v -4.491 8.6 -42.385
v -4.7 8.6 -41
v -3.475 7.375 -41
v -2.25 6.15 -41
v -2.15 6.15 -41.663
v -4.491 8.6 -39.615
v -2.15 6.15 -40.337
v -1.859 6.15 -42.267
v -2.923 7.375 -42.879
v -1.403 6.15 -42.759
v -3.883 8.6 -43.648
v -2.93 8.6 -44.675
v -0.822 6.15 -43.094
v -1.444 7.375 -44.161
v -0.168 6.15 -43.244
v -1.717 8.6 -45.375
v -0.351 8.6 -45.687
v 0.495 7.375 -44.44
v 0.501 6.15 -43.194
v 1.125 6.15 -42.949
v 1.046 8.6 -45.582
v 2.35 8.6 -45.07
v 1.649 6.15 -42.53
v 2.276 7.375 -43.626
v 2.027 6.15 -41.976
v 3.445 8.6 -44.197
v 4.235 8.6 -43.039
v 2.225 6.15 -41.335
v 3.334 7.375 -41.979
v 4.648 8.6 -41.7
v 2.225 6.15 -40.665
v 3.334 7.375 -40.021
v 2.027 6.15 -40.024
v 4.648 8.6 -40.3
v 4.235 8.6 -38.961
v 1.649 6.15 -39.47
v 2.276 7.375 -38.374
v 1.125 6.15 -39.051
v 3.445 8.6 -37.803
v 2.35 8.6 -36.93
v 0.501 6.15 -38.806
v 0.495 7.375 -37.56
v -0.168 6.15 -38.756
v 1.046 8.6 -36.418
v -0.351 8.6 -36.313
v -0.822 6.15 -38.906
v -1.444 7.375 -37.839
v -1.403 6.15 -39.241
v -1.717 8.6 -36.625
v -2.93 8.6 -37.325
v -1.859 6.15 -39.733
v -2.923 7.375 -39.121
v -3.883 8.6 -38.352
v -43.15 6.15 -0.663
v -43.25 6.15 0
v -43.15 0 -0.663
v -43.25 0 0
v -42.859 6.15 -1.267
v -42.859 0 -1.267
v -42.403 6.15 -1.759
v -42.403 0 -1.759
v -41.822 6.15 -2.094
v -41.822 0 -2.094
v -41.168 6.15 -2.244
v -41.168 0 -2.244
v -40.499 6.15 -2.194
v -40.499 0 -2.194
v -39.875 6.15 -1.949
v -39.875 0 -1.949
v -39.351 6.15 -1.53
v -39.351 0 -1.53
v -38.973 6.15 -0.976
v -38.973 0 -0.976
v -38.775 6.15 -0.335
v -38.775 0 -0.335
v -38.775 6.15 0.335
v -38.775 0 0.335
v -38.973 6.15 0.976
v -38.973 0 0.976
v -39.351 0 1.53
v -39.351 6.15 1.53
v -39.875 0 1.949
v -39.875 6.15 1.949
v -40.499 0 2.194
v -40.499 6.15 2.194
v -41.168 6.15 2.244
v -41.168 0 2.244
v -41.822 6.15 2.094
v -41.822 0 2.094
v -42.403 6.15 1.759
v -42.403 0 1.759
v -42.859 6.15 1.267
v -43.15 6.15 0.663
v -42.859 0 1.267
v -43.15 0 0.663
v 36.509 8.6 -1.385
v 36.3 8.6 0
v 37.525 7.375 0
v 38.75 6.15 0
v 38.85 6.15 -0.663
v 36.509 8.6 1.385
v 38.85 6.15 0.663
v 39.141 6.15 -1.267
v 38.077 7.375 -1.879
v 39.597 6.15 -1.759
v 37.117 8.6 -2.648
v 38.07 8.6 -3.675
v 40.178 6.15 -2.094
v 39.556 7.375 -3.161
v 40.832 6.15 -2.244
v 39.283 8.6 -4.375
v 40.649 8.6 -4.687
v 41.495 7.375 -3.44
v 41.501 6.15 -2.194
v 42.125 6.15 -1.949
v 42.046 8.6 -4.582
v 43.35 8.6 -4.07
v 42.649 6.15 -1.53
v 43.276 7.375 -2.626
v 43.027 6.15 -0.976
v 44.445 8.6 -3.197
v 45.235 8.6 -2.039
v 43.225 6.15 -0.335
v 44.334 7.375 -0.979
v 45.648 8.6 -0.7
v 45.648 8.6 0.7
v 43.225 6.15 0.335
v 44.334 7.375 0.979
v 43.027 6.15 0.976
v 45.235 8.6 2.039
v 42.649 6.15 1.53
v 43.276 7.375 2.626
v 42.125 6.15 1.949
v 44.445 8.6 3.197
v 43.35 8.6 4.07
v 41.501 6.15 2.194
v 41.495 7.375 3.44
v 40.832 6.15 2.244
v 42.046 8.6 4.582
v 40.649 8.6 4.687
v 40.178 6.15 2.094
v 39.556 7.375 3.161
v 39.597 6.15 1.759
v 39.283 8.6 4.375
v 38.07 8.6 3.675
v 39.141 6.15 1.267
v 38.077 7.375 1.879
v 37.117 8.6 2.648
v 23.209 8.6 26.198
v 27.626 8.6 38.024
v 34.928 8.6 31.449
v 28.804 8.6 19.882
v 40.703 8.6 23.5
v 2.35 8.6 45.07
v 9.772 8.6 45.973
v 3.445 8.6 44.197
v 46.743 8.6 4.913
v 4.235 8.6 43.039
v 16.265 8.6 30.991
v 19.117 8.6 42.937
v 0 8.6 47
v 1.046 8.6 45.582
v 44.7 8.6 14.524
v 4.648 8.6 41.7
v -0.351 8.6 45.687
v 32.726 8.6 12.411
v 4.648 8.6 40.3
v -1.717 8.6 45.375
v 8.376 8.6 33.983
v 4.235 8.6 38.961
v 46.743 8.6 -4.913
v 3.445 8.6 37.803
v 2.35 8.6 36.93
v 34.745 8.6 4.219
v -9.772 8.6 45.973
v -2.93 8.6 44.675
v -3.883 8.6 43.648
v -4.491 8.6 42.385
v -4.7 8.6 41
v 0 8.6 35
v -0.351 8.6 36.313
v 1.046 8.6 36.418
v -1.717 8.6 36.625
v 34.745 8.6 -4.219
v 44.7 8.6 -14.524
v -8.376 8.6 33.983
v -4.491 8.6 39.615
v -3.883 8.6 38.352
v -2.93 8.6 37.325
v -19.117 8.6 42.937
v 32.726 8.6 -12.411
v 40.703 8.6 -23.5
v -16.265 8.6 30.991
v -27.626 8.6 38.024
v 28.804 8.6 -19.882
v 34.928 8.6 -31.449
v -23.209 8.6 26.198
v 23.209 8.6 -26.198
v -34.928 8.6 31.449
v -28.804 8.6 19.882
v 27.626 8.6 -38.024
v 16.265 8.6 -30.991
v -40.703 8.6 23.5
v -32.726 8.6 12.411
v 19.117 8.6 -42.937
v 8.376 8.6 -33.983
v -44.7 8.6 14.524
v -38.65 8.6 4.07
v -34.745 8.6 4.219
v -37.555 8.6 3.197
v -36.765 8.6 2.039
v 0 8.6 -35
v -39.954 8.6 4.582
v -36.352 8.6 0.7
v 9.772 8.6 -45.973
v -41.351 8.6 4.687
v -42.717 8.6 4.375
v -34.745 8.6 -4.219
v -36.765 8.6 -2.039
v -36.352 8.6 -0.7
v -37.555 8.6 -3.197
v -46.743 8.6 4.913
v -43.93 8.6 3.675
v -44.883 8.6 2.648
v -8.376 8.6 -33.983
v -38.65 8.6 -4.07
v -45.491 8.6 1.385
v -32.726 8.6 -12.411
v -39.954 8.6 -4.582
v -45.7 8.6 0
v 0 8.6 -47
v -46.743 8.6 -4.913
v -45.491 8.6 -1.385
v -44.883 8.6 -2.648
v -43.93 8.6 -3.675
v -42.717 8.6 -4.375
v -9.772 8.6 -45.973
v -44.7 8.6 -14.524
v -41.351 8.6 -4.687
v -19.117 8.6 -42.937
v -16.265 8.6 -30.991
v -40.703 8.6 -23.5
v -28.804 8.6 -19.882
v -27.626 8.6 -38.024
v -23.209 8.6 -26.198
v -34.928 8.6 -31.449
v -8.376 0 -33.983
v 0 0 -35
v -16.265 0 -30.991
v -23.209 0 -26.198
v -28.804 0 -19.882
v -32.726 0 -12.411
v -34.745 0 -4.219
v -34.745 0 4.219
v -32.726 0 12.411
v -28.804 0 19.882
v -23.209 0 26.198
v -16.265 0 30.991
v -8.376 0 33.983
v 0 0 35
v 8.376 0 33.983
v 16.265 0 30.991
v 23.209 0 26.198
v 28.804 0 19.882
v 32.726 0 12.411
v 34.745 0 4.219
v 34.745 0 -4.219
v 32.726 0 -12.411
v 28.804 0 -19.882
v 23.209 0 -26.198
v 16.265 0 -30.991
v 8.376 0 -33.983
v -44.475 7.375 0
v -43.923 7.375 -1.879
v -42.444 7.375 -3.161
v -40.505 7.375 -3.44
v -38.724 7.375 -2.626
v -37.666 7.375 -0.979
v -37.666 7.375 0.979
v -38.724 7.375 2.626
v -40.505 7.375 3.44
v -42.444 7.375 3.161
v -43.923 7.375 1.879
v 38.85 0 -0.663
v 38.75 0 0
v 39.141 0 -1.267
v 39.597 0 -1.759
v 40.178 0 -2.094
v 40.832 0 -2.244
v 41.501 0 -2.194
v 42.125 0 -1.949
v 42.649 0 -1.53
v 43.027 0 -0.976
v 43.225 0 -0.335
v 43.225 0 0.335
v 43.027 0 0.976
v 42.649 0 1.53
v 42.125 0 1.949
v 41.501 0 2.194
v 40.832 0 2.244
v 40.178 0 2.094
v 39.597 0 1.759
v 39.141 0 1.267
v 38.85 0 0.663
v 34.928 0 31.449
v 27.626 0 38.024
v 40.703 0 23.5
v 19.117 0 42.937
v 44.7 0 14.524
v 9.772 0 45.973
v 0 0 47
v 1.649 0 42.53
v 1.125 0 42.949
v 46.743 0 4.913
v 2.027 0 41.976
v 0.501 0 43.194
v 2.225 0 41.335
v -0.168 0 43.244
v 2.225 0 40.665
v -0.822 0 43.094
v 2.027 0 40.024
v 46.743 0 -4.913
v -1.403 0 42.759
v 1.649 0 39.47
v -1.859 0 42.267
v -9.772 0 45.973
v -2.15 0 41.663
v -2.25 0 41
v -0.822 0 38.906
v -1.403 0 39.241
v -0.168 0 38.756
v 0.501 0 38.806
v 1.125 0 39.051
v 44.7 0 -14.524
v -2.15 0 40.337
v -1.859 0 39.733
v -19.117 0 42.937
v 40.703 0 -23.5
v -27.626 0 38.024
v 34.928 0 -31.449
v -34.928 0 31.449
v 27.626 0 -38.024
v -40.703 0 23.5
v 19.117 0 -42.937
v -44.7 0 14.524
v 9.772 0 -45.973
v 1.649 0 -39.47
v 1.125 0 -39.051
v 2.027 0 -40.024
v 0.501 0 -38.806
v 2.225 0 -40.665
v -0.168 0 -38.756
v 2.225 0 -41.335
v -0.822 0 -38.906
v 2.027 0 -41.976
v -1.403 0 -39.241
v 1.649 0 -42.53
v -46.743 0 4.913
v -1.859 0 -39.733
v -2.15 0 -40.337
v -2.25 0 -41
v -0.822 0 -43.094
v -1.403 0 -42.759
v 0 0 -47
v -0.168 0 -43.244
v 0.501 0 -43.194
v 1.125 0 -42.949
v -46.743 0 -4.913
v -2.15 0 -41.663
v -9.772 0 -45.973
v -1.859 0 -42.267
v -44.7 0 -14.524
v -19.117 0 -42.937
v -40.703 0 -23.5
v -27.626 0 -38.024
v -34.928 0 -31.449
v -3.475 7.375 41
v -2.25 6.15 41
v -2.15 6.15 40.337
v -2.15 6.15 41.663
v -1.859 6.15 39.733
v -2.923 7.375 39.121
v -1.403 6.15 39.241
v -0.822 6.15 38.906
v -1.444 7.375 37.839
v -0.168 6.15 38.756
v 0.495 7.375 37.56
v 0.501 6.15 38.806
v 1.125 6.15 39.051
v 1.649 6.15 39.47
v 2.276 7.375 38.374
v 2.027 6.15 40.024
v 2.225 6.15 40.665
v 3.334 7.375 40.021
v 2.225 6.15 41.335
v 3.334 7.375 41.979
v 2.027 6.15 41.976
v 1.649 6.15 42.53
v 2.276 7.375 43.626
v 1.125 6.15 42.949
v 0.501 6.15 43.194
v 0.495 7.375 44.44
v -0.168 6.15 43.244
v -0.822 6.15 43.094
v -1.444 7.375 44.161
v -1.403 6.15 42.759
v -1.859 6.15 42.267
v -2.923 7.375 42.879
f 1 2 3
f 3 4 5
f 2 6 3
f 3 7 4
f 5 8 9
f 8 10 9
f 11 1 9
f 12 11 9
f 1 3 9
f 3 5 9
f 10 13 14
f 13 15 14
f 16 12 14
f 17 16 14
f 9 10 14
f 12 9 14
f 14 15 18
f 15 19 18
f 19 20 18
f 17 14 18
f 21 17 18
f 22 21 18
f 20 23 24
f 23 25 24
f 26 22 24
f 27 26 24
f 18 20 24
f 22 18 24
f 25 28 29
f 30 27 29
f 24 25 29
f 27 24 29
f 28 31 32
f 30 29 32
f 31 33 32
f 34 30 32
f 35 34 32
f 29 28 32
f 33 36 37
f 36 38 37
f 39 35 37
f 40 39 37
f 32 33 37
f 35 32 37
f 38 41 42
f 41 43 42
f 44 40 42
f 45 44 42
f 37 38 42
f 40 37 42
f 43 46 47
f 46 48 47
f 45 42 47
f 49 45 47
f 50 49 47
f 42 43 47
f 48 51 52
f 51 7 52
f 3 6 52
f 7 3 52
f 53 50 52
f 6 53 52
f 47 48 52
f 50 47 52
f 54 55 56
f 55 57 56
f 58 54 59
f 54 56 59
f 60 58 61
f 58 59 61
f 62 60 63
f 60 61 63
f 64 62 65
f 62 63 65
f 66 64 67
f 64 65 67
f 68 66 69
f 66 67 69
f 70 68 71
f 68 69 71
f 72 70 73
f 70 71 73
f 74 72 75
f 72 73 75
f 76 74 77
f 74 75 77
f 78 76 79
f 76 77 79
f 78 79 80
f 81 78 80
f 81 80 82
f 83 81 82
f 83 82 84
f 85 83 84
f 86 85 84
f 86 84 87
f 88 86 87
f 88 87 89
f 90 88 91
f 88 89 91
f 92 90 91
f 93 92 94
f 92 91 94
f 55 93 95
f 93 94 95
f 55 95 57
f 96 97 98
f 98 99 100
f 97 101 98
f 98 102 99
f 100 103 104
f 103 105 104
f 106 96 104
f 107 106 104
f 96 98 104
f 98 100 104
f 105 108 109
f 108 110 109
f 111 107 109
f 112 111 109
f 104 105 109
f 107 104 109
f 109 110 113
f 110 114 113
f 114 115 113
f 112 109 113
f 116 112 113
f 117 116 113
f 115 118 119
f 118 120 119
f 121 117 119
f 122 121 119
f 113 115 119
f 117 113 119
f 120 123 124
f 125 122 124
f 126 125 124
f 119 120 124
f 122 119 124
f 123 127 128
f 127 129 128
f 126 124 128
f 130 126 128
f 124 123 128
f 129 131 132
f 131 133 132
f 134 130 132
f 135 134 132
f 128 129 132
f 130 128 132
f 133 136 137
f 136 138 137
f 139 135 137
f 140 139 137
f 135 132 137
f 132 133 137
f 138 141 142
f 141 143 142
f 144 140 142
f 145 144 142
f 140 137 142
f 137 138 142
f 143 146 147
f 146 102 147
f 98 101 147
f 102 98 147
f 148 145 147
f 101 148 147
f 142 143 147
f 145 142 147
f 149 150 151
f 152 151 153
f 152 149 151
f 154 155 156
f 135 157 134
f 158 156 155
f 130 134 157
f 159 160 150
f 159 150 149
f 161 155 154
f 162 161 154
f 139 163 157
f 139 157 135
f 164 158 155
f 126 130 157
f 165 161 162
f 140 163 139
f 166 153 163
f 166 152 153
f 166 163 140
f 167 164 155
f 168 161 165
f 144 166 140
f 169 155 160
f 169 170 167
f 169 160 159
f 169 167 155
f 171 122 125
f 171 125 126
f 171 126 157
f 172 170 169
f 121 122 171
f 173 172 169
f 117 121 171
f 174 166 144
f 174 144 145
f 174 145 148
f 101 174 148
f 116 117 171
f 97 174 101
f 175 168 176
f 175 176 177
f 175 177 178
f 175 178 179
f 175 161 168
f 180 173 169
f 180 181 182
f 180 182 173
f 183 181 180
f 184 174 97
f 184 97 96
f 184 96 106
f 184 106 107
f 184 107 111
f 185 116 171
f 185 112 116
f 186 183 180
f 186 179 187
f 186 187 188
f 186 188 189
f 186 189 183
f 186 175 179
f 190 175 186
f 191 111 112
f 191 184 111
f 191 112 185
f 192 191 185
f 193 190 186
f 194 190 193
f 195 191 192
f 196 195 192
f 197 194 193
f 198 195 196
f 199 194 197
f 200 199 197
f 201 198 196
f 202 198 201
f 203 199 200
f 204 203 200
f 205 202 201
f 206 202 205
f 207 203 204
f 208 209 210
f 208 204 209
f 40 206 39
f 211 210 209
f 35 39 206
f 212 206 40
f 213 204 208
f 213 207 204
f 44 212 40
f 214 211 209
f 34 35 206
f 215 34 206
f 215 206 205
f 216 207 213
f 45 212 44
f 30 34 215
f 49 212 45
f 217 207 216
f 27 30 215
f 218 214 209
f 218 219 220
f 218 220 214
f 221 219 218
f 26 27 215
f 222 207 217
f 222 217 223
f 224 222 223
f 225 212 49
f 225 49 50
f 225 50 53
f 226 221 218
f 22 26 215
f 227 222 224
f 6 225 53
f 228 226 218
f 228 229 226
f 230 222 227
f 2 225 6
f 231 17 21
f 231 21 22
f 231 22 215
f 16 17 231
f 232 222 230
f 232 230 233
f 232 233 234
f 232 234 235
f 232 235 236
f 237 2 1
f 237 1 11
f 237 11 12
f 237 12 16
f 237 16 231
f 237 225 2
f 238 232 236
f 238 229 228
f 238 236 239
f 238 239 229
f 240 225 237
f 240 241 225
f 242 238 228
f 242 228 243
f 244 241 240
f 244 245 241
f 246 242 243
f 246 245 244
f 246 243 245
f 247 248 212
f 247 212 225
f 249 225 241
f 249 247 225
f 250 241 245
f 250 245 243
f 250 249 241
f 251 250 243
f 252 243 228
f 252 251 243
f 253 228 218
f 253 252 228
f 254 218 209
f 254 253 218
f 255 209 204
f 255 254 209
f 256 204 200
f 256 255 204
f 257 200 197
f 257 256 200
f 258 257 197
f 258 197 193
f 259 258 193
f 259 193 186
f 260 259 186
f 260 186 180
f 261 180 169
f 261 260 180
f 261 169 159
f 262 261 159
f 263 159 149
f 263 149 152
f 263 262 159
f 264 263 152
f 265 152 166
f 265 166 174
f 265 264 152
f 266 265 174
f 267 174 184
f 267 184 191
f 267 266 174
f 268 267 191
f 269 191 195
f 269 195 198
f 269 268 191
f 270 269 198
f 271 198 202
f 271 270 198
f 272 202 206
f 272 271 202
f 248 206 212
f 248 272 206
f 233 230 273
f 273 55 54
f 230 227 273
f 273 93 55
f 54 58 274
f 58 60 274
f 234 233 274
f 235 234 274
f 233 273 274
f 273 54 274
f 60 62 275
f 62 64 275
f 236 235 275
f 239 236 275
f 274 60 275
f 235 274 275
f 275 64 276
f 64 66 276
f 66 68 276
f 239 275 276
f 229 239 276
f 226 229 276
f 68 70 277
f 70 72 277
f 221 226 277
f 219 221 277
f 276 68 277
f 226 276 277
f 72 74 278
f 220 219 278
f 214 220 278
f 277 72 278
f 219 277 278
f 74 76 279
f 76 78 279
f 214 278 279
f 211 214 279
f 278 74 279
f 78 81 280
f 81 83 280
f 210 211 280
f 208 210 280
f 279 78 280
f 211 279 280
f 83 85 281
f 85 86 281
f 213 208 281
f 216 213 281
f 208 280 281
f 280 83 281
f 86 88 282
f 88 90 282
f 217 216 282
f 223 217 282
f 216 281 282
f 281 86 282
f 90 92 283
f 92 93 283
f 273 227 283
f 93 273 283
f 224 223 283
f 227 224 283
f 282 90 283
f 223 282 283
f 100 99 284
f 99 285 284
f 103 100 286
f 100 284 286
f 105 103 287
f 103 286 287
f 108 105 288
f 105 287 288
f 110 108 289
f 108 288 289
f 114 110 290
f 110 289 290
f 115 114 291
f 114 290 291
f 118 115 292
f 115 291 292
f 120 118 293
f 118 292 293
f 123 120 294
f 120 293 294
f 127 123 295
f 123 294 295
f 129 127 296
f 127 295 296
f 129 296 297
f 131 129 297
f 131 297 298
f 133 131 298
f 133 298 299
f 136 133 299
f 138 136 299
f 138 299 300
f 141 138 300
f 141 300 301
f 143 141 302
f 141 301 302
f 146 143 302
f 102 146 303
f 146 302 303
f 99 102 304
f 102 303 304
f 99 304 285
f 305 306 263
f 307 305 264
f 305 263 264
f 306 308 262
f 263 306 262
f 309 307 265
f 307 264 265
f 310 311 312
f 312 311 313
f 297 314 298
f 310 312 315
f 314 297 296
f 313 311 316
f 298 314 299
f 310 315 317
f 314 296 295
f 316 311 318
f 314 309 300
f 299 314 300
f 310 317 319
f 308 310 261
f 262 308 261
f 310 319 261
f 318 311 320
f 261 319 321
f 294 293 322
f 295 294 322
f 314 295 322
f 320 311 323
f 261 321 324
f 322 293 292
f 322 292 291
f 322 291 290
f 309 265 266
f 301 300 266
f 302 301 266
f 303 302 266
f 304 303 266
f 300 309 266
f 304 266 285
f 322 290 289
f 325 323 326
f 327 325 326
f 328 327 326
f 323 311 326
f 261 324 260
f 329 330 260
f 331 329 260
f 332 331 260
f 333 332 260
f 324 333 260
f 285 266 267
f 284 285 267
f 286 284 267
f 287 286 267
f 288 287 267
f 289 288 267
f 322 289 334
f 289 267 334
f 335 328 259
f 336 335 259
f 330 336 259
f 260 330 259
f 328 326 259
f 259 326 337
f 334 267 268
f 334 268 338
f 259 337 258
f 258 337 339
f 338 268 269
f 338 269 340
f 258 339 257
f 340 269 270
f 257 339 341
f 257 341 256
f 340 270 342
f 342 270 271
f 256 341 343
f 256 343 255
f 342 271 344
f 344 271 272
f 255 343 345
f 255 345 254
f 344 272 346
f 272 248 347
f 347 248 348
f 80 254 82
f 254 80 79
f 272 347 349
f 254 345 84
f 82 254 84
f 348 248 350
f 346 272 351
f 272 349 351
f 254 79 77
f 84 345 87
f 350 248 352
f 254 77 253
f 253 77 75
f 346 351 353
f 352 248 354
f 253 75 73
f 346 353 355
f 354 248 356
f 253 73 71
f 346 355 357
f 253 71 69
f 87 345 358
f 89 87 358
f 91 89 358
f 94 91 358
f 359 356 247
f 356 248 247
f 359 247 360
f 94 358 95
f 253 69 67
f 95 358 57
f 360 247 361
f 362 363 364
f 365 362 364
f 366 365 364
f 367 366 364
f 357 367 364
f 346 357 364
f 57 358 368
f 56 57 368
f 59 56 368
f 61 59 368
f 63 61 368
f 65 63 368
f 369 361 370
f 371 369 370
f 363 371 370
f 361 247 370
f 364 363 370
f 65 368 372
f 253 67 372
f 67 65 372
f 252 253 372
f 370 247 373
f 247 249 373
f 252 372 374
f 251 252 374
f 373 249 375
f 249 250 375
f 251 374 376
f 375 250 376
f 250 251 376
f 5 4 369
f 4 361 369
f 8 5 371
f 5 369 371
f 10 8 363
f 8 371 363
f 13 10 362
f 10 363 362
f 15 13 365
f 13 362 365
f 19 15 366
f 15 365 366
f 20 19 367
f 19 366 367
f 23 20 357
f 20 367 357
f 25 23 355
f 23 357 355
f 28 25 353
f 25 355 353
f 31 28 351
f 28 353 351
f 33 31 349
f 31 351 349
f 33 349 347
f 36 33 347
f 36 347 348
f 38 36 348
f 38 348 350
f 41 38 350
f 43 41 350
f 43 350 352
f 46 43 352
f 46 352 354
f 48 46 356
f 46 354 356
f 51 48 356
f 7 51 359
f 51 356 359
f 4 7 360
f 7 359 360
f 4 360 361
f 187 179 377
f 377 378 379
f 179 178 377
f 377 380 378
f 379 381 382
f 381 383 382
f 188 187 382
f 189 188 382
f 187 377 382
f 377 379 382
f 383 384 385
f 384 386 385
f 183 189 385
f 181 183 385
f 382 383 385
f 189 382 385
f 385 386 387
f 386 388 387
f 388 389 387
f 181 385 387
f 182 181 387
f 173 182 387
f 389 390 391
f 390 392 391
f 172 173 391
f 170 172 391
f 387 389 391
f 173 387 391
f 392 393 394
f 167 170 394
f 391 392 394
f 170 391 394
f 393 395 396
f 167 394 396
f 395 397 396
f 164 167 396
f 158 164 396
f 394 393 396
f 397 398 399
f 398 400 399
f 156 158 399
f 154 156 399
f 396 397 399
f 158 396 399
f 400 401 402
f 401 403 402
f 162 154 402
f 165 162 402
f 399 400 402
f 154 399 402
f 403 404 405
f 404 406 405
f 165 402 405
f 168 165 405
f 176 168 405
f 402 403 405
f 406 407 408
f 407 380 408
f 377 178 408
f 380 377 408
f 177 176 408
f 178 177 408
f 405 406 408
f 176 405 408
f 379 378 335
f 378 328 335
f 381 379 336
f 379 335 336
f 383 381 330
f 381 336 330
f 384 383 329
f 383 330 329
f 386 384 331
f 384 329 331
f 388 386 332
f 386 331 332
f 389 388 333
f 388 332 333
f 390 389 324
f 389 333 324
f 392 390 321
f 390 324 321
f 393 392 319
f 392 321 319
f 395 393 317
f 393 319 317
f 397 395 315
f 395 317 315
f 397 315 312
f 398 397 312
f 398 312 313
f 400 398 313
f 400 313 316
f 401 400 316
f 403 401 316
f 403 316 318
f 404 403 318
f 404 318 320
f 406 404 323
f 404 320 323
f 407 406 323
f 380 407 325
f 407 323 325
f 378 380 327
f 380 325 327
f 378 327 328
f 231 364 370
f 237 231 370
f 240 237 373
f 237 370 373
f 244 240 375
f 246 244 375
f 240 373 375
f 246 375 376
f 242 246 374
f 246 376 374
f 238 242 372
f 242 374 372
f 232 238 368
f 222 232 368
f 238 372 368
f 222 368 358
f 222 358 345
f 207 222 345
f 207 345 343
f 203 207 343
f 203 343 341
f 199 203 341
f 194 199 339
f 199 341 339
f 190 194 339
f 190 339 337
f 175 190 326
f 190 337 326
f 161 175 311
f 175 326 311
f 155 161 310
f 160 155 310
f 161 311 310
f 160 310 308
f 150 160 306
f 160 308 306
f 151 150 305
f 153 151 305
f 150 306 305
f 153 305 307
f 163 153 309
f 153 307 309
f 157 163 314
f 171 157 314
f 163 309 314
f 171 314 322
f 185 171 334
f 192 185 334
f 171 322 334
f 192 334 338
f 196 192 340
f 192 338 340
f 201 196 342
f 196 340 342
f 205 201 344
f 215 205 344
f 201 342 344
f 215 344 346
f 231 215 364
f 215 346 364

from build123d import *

# Parameters (mm, degrees)
SKETCH1_R                                       = 47
SKETCH1_R_2                                     = 35
BOSS_EXTRUDE1_DEPTH                             = 8.6
CSK_FOR_M4_FLAT_HEAD_MACHINE_SCREW1_D           = 4.5
CSK_FOR_M4_FLAT_HEAD_MACHINE_SCREW1_CSINK_D     = 9.4
CSK_FOR_M4_FLAT_HEAD_MACHINE_SCREW1_CSINK_ANGLE = 90


with BuildPart() as part:
    # Sketch1 → Boss-Extrude1 (new body)
    with BuildSketch(Plane(origin=(0, 0, 0), x_dir=(1, 0, 0), z_dir=(0, 1, 0))):
        Circle(SKETCH1_R)
        Circle(SKETCH1_R_2, mode=Mode.SUBTRACT)
    extrude(amount=BOSS_EXTRUDE1_DEPTH)

    # CSK for M4 Flat Head Machine Screw1 (through all)
    with Locations(Plane(origin=(0, 8.6, 0), x_dir=(1, 0, 0), z_dir=(0, 1, 0))):
        with Locations((0, 41), (0, -41), (-41, 0), (41, 0)):
            CounterSinkHole(CSK_FOR_M4_FLAT_HEAD_MACHINE_SCREW1_D / 2, CSK_FOR_M4_FLAT_HEAD_MACHINE_SCREW1_CSINK_D / 2, counter_sink_angle=CSK_FOR_M4_FLAT_HEAD_MACHINE_SCREW1_CSINK_ANGLE)


solid = part.part
